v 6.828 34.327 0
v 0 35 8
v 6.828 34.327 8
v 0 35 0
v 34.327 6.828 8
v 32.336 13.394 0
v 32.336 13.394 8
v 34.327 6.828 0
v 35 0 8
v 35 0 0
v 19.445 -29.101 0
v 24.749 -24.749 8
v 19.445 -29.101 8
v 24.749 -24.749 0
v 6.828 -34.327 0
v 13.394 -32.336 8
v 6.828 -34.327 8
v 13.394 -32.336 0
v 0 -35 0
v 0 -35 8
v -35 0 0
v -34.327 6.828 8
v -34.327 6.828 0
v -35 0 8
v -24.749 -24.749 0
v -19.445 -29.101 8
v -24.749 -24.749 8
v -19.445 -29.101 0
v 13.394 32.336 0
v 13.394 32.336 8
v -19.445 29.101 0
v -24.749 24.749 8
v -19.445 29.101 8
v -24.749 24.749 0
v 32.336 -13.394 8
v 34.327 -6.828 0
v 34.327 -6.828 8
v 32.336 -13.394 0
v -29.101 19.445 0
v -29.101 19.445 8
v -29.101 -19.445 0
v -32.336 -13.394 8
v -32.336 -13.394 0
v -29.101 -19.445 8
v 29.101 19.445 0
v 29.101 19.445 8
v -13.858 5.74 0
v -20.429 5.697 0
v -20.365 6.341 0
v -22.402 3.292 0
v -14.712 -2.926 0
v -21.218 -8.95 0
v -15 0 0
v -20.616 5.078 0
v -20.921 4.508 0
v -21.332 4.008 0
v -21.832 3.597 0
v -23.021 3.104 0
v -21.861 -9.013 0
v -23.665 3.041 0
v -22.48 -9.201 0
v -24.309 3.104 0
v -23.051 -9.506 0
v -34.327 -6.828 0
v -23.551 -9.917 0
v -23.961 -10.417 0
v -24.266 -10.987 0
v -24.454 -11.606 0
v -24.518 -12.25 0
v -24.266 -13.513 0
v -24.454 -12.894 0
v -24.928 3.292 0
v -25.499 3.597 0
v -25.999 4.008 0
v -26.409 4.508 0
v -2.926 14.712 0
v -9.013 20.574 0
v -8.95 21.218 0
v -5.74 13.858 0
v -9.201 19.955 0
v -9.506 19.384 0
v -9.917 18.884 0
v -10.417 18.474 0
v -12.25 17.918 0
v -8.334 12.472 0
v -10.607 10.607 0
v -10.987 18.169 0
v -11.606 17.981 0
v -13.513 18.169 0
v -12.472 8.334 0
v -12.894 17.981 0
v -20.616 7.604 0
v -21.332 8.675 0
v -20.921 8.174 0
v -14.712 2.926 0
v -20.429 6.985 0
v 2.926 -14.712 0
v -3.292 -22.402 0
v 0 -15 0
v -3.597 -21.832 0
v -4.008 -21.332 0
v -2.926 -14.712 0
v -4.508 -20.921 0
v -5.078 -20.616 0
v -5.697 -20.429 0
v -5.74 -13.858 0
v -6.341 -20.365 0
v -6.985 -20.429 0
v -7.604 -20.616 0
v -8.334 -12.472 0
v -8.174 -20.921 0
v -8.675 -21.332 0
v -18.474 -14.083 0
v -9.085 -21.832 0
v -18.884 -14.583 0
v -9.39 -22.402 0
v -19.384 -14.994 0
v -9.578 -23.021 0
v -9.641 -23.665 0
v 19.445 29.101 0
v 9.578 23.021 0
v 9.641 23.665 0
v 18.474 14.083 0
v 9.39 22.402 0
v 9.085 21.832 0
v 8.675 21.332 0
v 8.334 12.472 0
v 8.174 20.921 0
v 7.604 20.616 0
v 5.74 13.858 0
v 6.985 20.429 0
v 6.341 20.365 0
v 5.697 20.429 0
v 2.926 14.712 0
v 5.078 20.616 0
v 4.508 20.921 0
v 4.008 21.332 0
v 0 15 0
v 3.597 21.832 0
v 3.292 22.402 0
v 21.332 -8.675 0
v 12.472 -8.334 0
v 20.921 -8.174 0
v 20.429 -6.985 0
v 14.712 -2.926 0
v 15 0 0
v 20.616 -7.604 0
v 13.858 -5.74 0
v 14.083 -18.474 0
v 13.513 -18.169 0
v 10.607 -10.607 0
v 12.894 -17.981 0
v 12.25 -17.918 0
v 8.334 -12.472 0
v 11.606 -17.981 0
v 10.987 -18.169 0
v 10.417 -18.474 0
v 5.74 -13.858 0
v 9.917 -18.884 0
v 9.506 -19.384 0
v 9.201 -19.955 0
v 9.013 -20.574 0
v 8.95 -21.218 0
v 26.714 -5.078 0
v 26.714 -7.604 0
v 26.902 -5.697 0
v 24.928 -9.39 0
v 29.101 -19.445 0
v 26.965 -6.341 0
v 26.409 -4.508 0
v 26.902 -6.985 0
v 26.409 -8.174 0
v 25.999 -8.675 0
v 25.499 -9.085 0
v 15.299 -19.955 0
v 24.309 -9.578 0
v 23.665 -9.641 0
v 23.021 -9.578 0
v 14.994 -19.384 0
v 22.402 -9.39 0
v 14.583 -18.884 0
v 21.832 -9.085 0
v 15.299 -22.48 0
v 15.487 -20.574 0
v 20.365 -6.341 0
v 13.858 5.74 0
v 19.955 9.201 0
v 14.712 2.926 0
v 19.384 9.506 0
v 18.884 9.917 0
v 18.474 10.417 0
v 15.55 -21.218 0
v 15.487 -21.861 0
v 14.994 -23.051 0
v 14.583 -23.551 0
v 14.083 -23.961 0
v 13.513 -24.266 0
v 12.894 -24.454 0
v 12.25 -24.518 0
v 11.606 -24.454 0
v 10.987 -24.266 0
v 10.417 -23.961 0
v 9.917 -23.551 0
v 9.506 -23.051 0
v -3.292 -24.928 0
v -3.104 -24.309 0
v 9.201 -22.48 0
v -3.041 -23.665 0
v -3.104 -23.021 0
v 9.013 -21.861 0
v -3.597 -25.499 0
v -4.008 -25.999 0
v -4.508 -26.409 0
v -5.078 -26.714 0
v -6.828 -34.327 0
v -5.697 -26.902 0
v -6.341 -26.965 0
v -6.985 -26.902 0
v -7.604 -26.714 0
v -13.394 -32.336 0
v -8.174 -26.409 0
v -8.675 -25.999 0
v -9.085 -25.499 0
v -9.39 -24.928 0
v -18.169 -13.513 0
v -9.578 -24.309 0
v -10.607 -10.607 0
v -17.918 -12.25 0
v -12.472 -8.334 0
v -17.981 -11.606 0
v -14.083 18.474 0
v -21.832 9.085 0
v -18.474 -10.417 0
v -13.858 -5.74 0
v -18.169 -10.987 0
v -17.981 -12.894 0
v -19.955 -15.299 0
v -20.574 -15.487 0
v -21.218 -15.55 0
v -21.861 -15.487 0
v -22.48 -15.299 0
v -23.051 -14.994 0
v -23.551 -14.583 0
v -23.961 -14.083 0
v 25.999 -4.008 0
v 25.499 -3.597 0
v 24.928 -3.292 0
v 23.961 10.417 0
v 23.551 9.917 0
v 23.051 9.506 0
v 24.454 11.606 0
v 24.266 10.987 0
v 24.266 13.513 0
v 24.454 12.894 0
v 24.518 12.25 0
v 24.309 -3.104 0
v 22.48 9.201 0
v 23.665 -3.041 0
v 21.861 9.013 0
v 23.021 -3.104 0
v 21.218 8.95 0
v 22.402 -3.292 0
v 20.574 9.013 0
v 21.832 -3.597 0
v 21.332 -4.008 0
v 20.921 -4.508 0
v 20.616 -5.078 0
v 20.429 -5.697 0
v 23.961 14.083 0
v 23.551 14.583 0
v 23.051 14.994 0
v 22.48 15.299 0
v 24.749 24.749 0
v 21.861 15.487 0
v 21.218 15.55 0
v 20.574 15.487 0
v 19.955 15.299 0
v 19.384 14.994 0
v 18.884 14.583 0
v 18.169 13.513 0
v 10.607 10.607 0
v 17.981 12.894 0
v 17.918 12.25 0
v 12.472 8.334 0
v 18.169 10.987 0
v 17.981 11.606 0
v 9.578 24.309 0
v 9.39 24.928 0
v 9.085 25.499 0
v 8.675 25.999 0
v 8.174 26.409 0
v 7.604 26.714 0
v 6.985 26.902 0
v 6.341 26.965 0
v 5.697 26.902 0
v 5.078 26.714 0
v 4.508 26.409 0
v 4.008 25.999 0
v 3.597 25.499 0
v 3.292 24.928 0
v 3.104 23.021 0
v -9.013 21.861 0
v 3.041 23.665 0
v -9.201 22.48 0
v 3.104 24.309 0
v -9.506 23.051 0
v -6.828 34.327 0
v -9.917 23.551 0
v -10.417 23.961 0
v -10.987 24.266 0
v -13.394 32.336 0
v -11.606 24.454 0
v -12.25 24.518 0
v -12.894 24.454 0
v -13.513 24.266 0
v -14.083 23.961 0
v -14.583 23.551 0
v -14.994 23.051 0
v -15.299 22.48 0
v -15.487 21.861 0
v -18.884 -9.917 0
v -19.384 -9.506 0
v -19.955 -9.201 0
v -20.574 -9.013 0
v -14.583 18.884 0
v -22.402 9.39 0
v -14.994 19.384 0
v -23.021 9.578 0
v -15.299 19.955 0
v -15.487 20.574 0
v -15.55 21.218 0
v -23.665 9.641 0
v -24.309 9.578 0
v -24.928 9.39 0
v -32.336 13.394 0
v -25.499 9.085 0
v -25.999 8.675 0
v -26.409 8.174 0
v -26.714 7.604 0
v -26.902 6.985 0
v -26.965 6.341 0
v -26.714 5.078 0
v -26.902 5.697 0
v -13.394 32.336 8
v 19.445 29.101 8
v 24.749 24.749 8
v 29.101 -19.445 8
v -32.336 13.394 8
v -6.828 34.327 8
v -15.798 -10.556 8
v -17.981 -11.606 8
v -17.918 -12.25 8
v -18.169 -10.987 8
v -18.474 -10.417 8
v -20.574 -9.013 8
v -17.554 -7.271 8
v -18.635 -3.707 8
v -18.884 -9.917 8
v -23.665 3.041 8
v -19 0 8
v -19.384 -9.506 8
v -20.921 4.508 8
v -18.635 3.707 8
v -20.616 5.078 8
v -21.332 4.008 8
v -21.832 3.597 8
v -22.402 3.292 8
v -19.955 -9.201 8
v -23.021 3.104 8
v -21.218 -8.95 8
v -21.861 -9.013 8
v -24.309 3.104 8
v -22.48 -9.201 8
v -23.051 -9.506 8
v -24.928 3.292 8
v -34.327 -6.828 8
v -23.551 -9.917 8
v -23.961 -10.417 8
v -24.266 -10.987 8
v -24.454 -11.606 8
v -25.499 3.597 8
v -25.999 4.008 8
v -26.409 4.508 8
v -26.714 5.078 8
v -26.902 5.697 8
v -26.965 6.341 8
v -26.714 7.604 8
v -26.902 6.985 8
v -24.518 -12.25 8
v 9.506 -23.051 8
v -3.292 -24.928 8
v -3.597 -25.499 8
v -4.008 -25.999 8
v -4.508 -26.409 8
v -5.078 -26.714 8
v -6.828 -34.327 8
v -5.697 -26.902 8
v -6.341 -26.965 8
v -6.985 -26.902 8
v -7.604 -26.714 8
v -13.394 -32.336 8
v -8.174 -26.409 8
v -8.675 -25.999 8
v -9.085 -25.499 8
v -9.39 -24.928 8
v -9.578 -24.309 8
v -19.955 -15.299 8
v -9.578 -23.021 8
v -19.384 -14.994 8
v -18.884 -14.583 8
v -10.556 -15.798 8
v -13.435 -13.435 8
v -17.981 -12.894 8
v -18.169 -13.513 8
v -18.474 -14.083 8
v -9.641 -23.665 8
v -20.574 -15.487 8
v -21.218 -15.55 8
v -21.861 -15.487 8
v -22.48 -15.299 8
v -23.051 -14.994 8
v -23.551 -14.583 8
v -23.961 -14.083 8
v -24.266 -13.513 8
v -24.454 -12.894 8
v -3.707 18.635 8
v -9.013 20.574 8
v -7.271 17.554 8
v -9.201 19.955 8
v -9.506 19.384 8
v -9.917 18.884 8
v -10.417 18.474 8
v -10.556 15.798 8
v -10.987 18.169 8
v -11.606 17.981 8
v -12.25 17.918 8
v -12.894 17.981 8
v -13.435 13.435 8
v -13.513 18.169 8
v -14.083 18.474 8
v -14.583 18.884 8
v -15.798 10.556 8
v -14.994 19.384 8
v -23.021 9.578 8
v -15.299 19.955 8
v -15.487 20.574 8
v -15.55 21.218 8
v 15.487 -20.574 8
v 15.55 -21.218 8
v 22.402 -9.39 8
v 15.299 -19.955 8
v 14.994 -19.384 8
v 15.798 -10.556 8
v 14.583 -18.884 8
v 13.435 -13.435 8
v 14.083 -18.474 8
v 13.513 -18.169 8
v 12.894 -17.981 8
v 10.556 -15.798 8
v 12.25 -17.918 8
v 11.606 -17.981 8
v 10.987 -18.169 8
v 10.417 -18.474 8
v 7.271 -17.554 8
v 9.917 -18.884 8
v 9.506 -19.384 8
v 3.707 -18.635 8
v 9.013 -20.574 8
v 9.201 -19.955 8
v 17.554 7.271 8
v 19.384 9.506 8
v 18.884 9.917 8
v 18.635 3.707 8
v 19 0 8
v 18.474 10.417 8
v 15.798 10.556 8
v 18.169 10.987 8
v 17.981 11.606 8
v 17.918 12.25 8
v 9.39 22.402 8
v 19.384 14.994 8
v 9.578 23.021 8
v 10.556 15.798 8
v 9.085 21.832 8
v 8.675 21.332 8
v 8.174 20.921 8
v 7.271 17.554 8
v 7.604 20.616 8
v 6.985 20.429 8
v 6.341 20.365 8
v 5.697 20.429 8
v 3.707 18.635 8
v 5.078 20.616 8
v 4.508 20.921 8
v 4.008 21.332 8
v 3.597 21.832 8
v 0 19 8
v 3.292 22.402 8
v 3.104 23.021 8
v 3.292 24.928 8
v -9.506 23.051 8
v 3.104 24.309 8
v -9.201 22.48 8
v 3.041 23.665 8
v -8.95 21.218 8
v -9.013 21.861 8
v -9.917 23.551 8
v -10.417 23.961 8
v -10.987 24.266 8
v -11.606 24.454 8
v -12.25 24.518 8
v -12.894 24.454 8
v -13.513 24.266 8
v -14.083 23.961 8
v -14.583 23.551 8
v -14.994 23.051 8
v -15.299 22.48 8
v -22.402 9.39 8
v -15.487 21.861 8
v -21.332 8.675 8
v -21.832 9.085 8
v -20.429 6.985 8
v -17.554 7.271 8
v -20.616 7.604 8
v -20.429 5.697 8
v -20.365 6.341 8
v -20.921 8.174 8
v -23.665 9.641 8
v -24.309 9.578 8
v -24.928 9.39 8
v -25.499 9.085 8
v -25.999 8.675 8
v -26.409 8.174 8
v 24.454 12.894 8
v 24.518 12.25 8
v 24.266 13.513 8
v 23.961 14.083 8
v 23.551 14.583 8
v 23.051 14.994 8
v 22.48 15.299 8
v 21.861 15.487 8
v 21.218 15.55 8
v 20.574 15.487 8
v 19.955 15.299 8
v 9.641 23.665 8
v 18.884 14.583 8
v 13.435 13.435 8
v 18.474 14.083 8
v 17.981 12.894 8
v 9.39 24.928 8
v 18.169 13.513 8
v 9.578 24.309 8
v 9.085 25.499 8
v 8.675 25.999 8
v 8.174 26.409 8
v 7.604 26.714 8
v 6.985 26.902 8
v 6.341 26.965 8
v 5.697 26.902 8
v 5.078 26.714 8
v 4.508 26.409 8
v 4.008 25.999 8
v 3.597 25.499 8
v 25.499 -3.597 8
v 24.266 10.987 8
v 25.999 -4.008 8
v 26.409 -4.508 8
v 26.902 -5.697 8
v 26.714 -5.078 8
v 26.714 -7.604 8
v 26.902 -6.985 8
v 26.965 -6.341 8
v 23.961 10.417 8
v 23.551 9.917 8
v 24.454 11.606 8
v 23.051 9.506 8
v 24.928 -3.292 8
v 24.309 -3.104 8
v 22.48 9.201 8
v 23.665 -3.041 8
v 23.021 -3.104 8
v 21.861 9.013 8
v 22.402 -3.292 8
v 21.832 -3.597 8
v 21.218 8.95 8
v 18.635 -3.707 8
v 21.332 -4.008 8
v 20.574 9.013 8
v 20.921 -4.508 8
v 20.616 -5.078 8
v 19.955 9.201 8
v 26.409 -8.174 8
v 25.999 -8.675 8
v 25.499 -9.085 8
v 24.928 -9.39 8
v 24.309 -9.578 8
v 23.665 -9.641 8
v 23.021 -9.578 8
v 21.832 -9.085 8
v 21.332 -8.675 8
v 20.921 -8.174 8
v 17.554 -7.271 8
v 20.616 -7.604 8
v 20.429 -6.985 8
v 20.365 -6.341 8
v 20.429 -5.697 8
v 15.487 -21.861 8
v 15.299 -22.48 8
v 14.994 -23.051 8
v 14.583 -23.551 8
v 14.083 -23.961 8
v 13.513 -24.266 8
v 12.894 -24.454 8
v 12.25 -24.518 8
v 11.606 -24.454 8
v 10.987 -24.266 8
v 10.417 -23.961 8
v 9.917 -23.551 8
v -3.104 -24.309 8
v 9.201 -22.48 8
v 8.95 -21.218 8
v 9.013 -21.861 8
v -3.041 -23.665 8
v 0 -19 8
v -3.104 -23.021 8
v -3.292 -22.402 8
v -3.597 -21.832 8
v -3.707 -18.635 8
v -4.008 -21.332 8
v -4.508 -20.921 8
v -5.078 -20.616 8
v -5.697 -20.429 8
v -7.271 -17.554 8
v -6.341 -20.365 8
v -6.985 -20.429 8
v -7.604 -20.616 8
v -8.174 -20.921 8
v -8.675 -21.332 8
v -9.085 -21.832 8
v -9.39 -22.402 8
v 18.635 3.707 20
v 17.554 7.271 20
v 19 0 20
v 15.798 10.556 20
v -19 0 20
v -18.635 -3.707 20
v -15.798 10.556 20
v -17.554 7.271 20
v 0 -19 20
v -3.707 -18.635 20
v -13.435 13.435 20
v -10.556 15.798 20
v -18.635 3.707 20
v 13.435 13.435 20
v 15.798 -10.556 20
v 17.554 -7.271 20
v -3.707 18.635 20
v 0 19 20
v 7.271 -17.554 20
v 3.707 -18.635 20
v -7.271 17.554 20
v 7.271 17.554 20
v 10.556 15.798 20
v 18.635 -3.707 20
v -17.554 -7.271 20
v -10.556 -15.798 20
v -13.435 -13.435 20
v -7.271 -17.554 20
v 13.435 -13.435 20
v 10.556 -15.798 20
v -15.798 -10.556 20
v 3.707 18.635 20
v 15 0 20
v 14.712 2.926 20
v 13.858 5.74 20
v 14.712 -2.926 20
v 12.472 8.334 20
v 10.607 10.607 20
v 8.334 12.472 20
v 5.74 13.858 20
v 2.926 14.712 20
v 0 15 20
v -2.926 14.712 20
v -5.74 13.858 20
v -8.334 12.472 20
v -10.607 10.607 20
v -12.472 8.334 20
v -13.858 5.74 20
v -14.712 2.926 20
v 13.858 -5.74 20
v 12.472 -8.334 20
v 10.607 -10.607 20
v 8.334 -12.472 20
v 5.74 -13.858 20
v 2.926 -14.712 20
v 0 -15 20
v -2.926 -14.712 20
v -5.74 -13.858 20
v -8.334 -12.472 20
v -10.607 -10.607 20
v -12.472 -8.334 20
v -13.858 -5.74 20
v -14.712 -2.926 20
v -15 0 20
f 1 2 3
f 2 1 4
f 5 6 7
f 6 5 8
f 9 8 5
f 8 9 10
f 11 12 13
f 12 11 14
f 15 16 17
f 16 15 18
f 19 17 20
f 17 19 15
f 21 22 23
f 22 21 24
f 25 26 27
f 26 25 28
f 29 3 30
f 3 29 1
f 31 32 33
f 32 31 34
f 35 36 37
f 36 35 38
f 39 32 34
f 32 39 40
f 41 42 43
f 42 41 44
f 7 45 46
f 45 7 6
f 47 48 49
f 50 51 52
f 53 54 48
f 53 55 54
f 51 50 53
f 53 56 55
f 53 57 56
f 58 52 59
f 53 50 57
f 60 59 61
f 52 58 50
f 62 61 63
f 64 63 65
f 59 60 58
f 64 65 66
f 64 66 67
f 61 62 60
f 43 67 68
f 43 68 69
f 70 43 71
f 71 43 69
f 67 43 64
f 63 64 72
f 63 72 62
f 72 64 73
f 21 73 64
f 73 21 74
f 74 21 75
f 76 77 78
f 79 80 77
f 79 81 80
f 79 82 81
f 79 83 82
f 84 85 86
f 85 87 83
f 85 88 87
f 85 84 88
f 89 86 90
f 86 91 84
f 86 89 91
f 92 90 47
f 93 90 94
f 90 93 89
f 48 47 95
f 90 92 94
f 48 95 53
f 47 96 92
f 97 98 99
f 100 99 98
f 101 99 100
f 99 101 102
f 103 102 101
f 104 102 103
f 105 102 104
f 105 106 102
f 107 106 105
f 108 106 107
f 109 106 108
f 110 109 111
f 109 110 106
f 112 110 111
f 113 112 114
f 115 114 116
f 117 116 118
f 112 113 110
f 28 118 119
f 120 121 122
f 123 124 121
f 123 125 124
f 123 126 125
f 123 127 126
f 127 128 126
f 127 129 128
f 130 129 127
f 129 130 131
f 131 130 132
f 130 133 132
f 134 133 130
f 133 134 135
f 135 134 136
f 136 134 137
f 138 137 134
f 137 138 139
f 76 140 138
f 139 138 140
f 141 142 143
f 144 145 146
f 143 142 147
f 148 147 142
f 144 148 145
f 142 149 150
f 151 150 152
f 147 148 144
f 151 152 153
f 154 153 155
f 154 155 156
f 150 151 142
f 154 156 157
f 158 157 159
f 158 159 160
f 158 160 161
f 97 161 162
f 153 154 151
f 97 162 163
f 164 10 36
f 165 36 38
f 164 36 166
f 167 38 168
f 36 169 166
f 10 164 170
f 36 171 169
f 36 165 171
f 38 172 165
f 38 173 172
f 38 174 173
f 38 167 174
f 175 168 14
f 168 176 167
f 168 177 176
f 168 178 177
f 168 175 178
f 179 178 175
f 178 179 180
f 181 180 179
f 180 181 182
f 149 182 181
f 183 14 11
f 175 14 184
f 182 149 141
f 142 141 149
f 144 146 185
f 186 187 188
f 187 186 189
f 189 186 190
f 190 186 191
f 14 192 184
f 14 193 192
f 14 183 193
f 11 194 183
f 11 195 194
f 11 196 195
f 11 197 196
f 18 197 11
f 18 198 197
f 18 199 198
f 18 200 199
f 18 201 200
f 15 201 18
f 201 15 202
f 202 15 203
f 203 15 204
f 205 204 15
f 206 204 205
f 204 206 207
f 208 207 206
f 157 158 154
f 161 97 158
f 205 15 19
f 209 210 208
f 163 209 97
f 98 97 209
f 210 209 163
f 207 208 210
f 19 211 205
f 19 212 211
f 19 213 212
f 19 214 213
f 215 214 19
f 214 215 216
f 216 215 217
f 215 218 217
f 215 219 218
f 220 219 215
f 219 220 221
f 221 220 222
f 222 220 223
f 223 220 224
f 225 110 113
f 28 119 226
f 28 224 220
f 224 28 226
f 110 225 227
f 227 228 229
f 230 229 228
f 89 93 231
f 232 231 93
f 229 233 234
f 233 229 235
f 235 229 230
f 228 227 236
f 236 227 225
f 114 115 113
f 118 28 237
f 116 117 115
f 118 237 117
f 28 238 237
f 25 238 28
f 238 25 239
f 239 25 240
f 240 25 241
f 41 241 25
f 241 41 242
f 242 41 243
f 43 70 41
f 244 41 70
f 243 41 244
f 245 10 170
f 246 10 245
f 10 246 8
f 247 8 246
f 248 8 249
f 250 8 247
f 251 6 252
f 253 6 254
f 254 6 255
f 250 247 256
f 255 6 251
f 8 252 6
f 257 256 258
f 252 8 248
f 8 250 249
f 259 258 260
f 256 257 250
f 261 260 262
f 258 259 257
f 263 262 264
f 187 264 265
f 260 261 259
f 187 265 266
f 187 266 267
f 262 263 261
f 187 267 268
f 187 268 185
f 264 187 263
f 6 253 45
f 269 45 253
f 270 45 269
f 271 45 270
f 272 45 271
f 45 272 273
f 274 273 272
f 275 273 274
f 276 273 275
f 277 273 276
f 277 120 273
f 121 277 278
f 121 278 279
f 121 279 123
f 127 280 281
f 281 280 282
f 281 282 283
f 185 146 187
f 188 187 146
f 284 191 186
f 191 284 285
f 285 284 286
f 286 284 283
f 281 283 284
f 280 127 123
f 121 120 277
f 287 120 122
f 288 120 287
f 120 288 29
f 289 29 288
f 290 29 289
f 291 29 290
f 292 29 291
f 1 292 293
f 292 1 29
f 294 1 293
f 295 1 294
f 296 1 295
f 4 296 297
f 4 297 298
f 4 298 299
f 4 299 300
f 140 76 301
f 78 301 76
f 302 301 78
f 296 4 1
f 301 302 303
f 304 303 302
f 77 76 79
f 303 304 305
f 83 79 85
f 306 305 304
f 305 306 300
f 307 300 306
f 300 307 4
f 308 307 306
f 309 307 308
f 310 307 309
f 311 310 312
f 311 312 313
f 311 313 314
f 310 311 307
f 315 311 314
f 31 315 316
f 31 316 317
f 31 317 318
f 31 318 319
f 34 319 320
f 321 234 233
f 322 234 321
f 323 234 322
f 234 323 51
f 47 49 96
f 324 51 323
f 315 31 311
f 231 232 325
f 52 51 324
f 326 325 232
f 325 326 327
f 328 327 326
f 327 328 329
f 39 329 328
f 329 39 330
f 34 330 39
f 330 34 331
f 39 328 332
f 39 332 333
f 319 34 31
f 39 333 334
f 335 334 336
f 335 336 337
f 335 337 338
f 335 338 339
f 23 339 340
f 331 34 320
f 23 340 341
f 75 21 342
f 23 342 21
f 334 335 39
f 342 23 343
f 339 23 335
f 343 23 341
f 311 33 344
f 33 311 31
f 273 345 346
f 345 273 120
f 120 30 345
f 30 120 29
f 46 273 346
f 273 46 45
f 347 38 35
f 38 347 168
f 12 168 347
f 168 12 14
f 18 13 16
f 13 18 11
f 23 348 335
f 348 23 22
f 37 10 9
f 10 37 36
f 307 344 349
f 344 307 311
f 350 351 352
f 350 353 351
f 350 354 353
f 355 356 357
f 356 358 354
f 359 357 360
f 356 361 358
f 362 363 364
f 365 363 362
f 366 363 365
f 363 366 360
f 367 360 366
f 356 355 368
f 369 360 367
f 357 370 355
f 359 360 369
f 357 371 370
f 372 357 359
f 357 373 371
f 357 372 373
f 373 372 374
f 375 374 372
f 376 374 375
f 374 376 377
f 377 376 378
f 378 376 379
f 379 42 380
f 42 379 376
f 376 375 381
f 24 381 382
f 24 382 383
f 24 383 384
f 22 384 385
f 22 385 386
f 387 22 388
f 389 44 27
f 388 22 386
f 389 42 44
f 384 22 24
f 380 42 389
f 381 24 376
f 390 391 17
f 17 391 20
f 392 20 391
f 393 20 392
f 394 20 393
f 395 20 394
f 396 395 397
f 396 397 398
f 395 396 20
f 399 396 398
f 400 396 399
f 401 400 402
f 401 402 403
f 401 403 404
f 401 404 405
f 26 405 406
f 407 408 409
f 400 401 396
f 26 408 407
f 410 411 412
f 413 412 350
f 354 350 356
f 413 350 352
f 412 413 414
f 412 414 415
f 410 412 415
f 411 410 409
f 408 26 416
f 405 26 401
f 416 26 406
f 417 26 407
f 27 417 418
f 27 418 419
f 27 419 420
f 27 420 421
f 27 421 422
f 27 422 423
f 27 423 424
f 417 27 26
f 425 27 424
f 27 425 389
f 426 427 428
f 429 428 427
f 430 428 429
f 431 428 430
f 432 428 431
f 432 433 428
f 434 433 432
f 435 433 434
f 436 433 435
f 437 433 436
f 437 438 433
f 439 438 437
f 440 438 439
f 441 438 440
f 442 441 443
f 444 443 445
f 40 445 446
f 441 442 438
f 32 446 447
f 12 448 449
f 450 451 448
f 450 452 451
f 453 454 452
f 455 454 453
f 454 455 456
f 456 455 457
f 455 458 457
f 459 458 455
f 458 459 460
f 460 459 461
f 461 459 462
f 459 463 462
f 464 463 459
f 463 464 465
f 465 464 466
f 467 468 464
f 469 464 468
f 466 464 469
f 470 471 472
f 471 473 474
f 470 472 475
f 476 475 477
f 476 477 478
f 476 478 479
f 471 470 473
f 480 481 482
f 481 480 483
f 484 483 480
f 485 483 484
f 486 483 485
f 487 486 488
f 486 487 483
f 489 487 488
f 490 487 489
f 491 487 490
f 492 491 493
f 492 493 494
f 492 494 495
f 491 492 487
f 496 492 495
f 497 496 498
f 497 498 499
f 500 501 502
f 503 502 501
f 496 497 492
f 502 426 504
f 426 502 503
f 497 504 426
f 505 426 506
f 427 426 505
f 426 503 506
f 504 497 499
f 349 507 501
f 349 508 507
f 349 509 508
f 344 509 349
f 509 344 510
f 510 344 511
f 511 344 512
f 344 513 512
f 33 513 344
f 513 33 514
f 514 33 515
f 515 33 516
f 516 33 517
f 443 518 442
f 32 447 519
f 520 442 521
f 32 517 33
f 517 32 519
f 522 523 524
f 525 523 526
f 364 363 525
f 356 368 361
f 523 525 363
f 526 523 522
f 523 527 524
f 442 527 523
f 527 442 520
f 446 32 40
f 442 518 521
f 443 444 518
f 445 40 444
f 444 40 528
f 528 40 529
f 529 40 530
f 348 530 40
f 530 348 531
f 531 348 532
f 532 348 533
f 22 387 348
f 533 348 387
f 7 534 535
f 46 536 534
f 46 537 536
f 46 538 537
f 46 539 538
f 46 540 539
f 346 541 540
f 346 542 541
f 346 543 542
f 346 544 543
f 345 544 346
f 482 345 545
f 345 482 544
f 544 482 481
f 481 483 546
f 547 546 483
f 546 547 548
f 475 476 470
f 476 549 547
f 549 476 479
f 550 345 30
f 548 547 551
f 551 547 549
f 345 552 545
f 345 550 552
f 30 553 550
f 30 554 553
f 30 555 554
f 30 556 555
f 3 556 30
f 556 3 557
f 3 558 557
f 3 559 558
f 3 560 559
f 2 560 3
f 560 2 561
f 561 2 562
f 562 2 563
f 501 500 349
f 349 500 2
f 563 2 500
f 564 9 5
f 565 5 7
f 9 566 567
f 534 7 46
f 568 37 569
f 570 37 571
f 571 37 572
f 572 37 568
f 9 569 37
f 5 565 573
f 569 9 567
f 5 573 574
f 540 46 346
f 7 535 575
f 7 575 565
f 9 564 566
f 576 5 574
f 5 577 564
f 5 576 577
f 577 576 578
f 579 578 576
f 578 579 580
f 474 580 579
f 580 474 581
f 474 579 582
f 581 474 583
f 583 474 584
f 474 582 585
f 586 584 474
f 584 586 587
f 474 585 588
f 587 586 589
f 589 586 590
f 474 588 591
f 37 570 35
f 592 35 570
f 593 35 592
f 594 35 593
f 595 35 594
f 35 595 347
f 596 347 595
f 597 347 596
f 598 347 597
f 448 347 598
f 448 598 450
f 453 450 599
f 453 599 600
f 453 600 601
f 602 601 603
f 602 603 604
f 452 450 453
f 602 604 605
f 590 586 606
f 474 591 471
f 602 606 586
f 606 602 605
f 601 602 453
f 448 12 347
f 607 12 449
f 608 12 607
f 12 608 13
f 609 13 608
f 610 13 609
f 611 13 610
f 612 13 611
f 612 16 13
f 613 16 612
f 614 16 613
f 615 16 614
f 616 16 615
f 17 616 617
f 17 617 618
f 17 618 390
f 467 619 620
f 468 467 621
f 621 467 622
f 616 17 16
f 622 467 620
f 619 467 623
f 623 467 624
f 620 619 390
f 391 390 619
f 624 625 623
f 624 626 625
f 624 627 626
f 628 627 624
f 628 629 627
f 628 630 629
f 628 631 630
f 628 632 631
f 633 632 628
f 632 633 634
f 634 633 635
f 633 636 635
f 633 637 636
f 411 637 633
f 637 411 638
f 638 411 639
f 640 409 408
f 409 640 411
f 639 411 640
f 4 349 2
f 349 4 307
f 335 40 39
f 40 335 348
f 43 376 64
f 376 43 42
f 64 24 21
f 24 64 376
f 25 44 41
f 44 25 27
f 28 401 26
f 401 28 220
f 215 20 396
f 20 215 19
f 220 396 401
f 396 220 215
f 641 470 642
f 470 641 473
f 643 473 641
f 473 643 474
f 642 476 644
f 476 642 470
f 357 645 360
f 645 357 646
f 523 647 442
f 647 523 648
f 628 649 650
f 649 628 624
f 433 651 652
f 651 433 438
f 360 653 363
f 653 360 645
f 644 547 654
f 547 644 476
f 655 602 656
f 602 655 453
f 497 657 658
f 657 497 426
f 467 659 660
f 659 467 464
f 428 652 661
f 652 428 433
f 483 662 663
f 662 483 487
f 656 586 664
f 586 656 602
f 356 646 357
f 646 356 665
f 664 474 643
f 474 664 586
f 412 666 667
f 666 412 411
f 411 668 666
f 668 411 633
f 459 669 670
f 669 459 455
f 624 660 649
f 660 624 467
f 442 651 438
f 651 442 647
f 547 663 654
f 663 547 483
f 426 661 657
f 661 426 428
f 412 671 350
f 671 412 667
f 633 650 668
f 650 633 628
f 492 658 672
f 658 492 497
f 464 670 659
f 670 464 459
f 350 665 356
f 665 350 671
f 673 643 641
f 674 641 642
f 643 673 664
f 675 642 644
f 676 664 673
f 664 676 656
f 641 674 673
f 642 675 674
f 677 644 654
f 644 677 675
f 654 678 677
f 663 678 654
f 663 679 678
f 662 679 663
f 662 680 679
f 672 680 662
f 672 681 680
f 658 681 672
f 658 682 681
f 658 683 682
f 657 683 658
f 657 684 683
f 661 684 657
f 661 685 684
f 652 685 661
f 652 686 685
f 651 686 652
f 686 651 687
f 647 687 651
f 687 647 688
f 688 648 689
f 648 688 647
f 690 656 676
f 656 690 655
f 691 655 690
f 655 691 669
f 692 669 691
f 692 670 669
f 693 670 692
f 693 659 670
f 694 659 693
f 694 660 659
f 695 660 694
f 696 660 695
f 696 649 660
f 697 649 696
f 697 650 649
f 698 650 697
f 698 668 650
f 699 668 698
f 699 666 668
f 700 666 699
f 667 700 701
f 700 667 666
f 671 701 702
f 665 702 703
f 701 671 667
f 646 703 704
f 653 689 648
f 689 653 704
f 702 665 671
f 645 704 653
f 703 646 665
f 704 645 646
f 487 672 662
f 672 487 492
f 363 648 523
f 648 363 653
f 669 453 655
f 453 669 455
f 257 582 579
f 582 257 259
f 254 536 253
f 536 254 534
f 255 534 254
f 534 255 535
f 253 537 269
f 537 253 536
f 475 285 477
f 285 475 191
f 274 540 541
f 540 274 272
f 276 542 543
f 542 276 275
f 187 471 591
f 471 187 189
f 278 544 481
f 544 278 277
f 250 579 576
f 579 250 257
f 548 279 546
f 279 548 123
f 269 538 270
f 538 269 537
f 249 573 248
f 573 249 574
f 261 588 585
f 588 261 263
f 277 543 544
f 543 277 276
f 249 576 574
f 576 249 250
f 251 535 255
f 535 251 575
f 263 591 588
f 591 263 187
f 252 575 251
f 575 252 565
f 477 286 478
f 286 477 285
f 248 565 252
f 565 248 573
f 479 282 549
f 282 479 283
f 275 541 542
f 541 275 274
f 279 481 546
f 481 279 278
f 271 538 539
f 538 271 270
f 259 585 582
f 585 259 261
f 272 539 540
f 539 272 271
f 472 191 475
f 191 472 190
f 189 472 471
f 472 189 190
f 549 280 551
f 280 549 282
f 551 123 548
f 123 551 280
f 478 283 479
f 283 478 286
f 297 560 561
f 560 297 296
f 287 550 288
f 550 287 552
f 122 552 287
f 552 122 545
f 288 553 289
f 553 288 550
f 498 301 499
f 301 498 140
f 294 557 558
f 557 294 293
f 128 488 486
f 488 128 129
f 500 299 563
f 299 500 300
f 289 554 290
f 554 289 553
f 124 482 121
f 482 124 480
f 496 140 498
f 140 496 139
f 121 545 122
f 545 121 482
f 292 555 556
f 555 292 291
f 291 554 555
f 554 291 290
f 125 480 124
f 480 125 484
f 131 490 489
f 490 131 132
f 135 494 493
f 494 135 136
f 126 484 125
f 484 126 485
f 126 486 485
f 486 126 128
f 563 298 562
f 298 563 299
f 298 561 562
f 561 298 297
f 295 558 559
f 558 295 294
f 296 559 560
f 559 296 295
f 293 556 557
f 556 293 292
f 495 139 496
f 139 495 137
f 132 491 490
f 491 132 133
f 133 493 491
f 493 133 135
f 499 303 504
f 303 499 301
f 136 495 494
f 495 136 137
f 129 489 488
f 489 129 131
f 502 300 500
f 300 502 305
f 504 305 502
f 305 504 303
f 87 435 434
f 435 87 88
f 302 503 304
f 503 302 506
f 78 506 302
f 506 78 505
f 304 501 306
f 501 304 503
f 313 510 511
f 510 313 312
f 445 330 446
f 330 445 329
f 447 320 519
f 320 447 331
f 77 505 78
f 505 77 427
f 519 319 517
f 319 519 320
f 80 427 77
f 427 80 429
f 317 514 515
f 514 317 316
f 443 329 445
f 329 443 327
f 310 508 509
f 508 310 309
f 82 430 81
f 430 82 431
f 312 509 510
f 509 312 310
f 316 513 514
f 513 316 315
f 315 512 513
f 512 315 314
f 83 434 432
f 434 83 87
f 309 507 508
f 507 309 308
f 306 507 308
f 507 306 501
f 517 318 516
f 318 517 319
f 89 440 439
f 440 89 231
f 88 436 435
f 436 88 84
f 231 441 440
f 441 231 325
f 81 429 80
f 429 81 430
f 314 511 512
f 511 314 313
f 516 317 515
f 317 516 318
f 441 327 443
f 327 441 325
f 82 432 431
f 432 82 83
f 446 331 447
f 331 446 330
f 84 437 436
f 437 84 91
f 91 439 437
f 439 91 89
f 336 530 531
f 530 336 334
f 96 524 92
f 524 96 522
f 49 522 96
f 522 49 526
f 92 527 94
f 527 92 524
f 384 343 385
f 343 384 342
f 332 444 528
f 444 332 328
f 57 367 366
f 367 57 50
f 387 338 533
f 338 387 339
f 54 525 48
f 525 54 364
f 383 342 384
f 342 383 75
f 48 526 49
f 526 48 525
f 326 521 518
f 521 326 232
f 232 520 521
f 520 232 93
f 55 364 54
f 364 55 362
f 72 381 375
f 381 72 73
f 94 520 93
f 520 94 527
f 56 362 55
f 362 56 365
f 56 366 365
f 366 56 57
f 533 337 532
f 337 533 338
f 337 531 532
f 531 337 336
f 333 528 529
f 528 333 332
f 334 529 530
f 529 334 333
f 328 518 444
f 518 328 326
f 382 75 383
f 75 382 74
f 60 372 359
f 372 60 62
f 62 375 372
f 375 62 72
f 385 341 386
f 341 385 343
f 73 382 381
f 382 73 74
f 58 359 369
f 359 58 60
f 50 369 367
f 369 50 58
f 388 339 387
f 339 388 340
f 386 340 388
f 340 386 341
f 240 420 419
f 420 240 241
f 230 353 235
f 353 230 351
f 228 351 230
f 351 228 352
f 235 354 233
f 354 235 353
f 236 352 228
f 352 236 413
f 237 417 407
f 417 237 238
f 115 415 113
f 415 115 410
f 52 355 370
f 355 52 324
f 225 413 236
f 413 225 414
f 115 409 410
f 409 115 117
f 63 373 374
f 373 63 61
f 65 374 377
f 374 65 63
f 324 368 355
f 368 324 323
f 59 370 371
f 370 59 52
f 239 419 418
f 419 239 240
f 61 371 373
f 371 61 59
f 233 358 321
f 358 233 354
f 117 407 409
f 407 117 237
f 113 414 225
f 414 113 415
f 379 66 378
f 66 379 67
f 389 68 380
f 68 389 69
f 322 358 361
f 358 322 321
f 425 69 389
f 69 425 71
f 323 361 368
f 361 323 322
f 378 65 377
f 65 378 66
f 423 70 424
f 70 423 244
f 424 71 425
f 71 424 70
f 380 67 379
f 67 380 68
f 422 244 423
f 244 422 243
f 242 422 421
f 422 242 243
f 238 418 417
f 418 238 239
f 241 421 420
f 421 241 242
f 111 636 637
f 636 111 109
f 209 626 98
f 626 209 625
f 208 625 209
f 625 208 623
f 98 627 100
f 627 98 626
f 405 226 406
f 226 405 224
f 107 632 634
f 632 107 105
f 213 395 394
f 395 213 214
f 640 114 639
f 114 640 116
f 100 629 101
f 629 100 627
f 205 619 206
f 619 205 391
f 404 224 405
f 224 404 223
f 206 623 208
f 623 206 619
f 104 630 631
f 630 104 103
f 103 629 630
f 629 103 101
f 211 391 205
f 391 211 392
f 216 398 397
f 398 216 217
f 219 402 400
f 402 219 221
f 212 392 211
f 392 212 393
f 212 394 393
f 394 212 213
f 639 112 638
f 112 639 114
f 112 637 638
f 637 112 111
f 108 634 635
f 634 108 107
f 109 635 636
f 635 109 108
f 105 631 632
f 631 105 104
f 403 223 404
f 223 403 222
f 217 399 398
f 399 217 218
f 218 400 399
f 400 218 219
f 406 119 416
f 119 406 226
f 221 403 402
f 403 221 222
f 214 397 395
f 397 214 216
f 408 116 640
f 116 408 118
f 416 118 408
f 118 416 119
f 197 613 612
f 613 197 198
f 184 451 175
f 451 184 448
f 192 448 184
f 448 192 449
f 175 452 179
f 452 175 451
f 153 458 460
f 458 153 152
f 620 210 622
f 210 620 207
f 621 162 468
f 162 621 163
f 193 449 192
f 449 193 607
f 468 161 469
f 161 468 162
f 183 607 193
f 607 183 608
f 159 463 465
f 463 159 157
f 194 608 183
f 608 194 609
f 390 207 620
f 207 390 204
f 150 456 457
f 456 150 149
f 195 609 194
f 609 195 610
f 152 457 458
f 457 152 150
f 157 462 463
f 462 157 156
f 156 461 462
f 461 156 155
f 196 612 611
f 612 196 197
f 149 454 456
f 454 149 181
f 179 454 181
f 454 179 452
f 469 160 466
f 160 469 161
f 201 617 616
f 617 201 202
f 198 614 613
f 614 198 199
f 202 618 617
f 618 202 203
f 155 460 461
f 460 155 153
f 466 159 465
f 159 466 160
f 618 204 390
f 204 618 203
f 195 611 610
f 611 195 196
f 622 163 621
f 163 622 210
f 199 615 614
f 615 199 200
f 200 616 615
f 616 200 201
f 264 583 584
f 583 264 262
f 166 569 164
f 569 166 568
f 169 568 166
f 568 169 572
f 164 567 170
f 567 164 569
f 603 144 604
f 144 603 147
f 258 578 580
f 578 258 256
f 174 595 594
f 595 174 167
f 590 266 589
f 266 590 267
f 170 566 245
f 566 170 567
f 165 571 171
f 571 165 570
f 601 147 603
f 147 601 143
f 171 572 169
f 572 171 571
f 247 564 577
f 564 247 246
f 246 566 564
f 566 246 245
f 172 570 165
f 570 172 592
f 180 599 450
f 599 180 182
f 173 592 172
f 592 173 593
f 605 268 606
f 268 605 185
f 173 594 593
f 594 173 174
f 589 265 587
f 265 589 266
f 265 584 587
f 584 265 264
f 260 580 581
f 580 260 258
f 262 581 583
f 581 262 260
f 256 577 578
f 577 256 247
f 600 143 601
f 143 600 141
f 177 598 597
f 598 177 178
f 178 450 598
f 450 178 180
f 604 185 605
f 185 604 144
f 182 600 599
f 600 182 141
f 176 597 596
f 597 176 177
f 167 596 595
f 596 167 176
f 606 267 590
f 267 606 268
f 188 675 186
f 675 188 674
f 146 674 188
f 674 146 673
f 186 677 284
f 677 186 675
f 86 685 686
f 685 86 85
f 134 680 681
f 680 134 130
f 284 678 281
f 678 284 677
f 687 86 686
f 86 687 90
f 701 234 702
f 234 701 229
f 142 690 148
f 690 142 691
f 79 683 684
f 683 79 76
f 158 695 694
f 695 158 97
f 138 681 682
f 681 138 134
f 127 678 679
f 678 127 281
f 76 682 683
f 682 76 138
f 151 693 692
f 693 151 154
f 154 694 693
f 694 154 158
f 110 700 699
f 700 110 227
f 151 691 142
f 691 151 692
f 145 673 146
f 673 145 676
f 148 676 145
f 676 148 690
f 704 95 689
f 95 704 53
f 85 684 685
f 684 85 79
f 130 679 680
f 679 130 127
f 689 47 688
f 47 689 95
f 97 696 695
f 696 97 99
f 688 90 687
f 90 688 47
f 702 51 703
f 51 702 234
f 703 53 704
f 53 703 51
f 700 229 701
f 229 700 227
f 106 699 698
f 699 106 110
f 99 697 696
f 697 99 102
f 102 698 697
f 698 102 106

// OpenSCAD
$fn = 32;

// ----------------------------------------------------------------------
// Flange Ø70 x 8
// 8 holes on a Ø49 bolt circle, bolted joints
// ----------------------------------------------------------------------

// --- parameters (mm) ---
flange_d = 70;   // outside diameter of the flange
thickness = 8;   // flange thickness
holes = 8;       // number of bolt holes
pcd = 49;        // bolt circle diameter
start_deg = 30;  // angle of the first hole, from +X
hole_d = 6.6;    // bolt hole diameter
bore_d = 30;     // central through bore
hub_d = 38;      // hub outside diameter
hub_h = 12;      // hub height above the flange face (0 = no hub)

// --- derived feature positions (mm) ---
height = thickness + hub_h;  // = 20   overall height of the part
pcd_r = pcd / 2;             // = 24.5   bolt circle radius
hole_step = 360 / holes;     // = 45   angular pitch
feature_centers = [
  [pcd_r * cos(start_deg + 0 * hole_step), pcd_r * sin(start_deg + 0 * hole_step)],
  [pcd_r * cos(start_deg + 1 * hole_step), pcd_r * sin(start_deg + 1 * hole_step)],
  [pcd_r * cos(start_deg + 2 * hole_step), pcd_r * sin(start_deg + 2 * hole_step)],
  [pcd_r * cos(start_deg + 3 * hole_step), pcd_r * sin(start_deg + 3 * hole_step)],
  [pcd_r * cos(start_deg + 4 * hole_step), pcd_r * sin(start_deg + 4 * hole_step)],
  [pcd_r * cos(start_deg + 5 * hole_step), pcd_r * sin(start_deg + 5 * hole_step)],
  [pcd_r * cos(start_deg + 6 * hole_step), pcd_r * sin(start_deg + 6 * hole_step)],
  [pcd_r * cos(start_deg + 7 * hole_step), pcd_r * sin(start_deg + 7 * hole_step)]
];   // bolt hole centres on the pitch circle

// flange disc, every hole and the bore cut straight through
difference() {
  union() {
    cylinder(d = flange_d, h = thickness);
    cylinder(d = hub_d, h = height);  // hub, overlapped into the flange
  }
  translate([0, 0, -1]) cylinder(d = bore_d, h = height + 2);  // bore, through
  for (centre = feature_centers)
    translate([centre[0], centre[1], -1]) cylinder(d = hole_d, h = thickness + 2);
}
